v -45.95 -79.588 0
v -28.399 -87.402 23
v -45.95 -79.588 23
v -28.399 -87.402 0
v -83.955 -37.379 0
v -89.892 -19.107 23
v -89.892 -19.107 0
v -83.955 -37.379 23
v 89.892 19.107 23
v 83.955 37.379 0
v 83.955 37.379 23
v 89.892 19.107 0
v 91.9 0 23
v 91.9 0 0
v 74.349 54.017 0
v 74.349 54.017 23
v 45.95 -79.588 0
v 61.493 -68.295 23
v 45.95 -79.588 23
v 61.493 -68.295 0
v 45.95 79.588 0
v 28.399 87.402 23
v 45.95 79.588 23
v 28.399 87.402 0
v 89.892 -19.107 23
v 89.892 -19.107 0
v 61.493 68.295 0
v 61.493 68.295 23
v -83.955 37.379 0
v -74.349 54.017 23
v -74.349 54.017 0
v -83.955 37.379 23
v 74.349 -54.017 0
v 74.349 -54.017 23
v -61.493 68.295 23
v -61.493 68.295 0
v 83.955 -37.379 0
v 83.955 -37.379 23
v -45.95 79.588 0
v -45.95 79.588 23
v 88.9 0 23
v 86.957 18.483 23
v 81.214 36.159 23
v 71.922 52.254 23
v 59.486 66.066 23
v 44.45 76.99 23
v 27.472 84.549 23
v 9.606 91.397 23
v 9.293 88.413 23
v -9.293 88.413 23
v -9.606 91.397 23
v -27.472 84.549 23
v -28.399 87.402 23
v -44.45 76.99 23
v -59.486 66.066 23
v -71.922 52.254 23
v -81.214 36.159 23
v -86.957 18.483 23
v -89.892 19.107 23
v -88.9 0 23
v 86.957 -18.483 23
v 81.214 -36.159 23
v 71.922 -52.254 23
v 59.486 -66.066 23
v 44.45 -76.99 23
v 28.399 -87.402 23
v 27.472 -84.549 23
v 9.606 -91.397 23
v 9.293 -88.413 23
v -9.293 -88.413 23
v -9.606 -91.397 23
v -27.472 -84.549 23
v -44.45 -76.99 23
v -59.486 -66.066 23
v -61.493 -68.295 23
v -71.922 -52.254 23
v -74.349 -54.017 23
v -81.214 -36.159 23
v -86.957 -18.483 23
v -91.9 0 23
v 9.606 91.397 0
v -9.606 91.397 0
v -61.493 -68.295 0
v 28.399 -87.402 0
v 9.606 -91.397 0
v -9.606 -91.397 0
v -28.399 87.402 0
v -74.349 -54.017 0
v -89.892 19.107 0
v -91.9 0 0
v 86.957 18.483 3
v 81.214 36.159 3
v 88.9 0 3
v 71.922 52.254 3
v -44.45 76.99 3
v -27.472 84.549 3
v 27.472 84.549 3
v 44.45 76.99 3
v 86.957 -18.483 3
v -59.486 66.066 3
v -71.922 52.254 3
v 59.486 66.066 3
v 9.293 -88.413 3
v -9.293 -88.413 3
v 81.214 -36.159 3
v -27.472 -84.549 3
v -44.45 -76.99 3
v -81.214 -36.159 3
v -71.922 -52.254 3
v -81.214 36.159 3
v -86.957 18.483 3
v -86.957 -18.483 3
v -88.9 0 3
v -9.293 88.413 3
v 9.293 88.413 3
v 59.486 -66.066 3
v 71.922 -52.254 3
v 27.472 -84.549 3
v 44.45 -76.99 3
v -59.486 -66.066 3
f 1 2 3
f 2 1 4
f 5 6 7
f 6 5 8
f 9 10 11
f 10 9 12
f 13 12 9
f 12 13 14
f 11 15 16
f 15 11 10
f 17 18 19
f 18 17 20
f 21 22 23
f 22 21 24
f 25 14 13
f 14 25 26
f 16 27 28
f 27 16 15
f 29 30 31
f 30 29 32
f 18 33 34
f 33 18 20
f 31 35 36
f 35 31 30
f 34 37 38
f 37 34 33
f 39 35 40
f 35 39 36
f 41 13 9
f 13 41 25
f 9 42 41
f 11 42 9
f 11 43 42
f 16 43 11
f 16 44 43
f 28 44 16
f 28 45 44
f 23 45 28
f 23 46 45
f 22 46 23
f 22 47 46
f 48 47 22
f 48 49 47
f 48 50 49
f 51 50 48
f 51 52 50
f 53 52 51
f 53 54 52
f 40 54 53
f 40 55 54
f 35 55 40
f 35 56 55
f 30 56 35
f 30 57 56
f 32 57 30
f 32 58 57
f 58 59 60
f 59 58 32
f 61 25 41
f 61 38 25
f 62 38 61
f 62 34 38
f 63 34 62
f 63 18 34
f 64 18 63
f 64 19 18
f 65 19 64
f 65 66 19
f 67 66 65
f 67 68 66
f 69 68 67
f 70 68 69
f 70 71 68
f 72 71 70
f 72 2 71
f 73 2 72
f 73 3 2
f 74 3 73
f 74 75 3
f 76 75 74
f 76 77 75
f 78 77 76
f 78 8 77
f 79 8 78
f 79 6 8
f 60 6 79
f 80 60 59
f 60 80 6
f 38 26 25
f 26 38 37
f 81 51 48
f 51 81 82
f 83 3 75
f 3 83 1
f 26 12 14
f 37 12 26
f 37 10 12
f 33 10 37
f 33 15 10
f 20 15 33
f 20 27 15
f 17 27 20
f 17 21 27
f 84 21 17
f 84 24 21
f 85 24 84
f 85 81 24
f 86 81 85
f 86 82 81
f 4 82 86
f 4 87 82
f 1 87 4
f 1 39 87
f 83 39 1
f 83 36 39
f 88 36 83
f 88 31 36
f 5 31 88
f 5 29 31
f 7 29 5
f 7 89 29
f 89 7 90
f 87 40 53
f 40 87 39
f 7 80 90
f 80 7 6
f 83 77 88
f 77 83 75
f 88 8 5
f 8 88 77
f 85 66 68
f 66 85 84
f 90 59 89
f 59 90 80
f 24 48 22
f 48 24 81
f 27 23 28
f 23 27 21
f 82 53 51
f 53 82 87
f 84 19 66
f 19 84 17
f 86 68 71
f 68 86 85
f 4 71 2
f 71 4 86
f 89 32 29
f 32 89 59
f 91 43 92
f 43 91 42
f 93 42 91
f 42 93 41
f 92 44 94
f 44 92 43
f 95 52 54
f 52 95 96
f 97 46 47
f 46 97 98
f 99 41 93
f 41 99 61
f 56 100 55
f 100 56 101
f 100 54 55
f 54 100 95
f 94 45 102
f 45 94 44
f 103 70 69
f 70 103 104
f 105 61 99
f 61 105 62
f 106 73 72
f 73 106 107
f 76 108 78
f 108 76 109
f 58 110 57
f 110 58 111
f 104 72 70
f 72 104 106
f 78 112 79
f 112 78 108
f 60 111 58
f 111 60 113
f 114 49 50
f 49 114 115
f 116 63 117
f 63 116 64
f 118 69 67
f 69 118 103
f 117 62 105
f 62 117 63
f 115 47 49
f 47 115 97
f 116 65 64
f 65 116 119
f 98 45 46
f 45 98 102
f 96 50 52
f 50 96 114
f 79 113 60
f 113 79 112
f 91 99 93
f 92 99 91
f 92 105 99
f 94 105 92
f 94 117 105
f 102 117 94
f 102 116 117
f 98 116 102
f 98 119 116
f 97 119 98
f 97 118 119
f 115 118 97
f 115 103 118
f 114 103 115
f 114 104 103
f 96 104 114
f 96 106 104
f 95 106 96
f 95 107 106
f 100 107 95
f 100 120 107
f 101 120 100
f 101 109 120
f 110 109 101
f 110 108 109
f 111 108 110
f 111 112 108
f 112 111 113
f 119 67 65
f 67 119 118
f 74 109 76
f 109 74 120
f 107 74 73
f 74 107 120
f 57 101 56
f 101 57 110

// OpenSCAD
function in_to_mm(in) = in * 25.4;

lamp_od = in_to_mm(7);

cover_thickness = 3;
cover_rim = 20;

cover_height = cover_rim + cover_thickness;
cover_od = lamp_od + cover_thickness * 2;
cover_id = lamp_od;

difference(){
	cylinder(d = cover_od, h = cover_height);
	translate([0,0,cover_thickness])cylinder(d = cover_id, h = cover_height);
}
